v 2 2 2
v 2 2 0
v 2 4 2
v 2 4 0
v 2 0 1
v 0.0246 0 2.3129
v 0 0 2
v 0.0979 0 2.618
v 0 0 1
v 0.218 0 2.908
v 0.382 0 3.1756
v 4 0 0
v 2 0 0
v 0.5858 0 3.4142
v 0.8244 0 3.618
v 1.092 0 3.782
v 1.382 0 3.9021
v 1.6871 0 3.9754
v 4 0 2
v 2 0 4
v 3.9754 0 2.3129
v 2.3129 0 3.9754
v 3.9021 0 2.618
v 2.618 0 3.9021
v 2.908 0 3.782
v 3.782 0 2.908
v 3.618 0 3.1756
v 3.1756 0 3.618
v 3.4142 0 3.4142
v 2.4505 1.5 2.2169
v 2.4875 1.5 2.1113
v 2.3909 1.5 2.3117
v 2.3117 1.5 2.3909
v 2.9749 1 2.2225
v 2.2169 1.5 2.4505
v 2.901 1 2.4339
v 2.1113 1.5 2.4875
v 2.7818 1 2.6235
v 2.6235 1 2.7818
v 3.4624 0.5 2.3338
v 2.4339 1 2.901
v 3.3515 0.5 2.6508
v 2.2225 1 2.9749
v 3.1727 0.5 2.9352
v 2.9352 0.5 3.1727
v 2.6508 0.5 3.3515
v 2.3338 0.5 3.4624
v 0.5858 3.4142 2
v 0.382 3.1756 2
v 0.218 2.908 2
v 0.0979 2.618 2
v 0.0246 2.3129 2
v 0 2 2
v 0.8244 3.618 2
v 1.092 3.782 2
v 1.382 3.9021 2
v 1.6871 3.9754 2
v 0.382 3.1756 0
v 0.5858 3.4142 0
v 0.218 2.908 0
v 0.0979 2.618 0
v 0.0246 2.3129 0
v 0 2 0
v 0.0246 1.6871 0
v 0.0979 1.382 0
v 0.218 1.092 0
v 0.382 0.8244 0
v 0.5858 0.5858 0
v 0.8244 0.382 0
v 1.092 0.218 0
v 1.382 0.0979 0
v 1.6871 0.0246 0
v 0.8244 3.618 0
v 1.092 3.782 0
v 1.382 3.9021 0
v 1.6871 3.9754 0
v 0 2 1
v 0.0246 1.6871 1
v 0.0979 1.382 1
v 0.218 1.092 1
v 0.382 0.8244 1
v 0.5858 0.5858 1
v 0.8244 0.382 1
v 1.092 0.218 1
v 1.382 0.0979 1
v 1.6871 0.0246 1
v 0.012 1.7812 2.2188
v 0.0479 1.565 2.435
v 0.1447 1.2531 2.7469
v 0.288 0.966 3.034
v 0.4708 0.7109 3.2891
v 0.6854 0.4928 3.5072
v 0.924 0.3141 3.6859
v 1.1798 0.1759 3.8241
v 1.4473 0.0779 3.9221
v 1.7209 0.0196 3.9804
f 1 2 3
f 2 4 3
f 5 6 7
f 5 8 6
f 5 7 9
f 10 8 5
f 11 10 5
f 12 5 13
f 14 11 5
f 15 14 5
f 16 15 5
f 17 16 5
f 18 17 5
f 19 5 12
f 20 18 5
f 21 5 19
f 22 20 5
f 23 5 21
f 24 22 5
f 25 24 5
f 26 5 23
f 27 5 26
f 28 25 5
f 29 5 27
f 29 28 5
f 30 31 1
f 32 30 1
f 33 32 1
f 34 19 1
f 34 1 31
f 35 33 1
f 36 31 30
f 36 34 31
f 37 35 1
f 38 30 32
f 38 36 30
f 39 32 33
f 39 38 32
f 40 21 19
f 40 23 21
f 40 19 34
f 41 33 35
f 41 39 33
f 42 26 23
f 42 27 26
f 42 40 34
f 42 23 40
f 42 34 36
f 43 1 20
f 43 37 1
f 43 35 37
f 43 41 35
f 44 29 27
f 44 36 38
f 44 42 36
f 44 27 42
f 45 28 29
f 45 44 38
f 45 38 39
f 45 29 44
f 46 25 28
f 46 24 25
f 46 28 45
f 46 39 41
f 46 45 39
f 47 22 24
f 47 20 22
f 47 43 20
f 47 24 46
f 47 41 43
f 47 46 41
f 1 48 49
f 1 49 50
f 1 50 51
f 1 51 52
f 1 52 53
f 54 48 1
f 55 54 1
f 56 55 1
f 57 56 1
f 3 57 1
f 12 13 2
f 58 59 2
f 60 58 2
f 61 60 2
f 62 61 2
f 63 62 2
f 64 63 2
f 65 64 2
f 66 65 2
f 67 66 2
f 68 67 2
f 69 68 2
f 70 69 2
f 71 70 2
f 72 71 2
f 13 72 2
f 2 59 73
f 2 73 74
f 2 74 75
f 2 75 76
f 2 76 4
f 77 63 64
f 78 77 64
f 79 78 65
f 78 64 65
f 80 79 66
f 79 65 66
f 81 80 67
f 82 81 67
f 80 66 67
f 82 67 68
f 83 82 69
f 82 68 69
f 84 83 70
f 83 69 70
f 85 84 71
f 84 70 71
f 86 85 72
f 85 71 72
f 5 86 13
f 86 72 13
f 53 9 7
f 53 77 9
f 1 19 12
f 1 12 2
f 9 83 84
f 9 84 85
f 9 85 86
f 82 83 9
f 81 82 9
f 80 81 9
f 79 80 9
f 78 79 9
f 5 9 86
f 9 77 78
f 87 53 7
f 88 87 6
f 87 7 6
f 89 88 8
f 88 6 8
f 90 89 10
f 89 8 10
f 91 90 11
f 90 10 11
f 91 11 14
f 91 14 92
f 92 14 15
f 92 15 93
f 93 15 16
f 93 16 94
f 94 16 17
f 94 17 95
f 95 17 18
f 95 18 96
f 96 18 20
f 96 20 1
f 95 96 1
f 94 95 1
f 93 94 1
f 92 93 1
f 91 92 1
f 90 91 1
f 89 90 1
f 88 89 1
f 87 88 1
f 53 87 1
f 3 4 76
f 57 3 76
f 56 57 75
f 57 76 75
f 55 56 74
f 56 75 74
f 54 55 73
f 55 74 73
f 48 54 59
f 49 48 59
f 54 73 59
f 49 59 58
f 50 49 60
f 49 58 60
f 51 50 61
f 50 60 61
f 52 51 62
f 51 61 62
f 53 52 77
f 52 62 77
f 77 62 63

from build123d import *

# Parameters (mm, degrees)
BOSS_EXTRUDE1_DEPTH = 2
REVOLVE1_ANGLE      = 90
BOSS_EXTRUDE2_DEPTH = 2
CUT_EXTRUDE1_DEPTH  = 2
CUT_EXTRUDE2_DEPTH  = 1
BOSS_EXTRUDE3_DEPTH = 2


with BuildPart() as part:
    # Sketch1 → Boss-Extrude1 (new body)
    with BuildSketch(Plane.XY):
        with BuildLine():
            Line((0, 0), (2, 0))
            Line((2, 0), (2, 4))
            ThreePointArc((2, 4), (0.585786438, 3.414213562), (0, 2))
            Line((0, 2), (0, 0))
        make_face()
    extrude(amount=BOSS_EXTRUDE1_DEPTH)

    # Sketch4 → Boss-Extrude2 (add)
    with BuildSketch(Plane.ZY.offset(-2)):
        Polygon((2, 2), (2, 0), (4, 0), align=None)
    extrude(amount=BOSS_EXTRUDE2_DEPTH)

    # Sketch5 → Cut-Extrude1 (cut)
    with BuildSketch(Plane.XZ):
        with BuildLine():
            Line((2, 4), (0, 4))
            Line((0, 4), (0, 2))
            ThreePointArc((0, 2), (0.585786438, 3.414213562), (2, 4))
        make_face()
    extrude(amount=-CUT_EXTRUDE1_DEPTH, mode=Mode.SUBTRACT)

    # Sketch7 → Cut-Extrude2 (cut)
    with BuildSketch(Plane(origin=(0, 0, 0), x_dir=(-1, 0, 0), z_dir=(0, 0, -1))):
        with BuildLine():
            Line((-2, 0), (0, 0))
            Line((0, 0), (0, 2))
            ThreePointArc((0, 2), (-0.585786438, 0.585786438), (-2, 0))
        make_face()
    extrude(amount=-CUT_EXTRUDE2_DEPTH, mode=Mode.SUBTRACT)



with BuildPart() as body_2:
    # Sketch3 → Revolve1 (revolve)
    with BuildSketch(Plane.XY.offset(2)):
        Polygon((2, 2), (4, 0), (2, 0), align=None)
    revolve(axis=Axis((2, 2, 2), (0, -1, 0)), revolution_arc=REVOLVE1_ANGLE)


with BuildPart() as part_1:
    add(part.part)

    add(body_2.part)  # Boss-Extrude3 merges body 2
    # Sketch8 → Boss-Extrude3 (add)
    with BuildSketch(Plane(origin=(0, 0, 2), x_dir=(-1, 0, 0), z_dir=(0, 0, -1))):
        Polygon((-2, 2), (-2, 0), (-4, 0), align=None)
    extrude(amount=BOSS_EXTRUDE3_DEPTH)


solid = part_1.part
